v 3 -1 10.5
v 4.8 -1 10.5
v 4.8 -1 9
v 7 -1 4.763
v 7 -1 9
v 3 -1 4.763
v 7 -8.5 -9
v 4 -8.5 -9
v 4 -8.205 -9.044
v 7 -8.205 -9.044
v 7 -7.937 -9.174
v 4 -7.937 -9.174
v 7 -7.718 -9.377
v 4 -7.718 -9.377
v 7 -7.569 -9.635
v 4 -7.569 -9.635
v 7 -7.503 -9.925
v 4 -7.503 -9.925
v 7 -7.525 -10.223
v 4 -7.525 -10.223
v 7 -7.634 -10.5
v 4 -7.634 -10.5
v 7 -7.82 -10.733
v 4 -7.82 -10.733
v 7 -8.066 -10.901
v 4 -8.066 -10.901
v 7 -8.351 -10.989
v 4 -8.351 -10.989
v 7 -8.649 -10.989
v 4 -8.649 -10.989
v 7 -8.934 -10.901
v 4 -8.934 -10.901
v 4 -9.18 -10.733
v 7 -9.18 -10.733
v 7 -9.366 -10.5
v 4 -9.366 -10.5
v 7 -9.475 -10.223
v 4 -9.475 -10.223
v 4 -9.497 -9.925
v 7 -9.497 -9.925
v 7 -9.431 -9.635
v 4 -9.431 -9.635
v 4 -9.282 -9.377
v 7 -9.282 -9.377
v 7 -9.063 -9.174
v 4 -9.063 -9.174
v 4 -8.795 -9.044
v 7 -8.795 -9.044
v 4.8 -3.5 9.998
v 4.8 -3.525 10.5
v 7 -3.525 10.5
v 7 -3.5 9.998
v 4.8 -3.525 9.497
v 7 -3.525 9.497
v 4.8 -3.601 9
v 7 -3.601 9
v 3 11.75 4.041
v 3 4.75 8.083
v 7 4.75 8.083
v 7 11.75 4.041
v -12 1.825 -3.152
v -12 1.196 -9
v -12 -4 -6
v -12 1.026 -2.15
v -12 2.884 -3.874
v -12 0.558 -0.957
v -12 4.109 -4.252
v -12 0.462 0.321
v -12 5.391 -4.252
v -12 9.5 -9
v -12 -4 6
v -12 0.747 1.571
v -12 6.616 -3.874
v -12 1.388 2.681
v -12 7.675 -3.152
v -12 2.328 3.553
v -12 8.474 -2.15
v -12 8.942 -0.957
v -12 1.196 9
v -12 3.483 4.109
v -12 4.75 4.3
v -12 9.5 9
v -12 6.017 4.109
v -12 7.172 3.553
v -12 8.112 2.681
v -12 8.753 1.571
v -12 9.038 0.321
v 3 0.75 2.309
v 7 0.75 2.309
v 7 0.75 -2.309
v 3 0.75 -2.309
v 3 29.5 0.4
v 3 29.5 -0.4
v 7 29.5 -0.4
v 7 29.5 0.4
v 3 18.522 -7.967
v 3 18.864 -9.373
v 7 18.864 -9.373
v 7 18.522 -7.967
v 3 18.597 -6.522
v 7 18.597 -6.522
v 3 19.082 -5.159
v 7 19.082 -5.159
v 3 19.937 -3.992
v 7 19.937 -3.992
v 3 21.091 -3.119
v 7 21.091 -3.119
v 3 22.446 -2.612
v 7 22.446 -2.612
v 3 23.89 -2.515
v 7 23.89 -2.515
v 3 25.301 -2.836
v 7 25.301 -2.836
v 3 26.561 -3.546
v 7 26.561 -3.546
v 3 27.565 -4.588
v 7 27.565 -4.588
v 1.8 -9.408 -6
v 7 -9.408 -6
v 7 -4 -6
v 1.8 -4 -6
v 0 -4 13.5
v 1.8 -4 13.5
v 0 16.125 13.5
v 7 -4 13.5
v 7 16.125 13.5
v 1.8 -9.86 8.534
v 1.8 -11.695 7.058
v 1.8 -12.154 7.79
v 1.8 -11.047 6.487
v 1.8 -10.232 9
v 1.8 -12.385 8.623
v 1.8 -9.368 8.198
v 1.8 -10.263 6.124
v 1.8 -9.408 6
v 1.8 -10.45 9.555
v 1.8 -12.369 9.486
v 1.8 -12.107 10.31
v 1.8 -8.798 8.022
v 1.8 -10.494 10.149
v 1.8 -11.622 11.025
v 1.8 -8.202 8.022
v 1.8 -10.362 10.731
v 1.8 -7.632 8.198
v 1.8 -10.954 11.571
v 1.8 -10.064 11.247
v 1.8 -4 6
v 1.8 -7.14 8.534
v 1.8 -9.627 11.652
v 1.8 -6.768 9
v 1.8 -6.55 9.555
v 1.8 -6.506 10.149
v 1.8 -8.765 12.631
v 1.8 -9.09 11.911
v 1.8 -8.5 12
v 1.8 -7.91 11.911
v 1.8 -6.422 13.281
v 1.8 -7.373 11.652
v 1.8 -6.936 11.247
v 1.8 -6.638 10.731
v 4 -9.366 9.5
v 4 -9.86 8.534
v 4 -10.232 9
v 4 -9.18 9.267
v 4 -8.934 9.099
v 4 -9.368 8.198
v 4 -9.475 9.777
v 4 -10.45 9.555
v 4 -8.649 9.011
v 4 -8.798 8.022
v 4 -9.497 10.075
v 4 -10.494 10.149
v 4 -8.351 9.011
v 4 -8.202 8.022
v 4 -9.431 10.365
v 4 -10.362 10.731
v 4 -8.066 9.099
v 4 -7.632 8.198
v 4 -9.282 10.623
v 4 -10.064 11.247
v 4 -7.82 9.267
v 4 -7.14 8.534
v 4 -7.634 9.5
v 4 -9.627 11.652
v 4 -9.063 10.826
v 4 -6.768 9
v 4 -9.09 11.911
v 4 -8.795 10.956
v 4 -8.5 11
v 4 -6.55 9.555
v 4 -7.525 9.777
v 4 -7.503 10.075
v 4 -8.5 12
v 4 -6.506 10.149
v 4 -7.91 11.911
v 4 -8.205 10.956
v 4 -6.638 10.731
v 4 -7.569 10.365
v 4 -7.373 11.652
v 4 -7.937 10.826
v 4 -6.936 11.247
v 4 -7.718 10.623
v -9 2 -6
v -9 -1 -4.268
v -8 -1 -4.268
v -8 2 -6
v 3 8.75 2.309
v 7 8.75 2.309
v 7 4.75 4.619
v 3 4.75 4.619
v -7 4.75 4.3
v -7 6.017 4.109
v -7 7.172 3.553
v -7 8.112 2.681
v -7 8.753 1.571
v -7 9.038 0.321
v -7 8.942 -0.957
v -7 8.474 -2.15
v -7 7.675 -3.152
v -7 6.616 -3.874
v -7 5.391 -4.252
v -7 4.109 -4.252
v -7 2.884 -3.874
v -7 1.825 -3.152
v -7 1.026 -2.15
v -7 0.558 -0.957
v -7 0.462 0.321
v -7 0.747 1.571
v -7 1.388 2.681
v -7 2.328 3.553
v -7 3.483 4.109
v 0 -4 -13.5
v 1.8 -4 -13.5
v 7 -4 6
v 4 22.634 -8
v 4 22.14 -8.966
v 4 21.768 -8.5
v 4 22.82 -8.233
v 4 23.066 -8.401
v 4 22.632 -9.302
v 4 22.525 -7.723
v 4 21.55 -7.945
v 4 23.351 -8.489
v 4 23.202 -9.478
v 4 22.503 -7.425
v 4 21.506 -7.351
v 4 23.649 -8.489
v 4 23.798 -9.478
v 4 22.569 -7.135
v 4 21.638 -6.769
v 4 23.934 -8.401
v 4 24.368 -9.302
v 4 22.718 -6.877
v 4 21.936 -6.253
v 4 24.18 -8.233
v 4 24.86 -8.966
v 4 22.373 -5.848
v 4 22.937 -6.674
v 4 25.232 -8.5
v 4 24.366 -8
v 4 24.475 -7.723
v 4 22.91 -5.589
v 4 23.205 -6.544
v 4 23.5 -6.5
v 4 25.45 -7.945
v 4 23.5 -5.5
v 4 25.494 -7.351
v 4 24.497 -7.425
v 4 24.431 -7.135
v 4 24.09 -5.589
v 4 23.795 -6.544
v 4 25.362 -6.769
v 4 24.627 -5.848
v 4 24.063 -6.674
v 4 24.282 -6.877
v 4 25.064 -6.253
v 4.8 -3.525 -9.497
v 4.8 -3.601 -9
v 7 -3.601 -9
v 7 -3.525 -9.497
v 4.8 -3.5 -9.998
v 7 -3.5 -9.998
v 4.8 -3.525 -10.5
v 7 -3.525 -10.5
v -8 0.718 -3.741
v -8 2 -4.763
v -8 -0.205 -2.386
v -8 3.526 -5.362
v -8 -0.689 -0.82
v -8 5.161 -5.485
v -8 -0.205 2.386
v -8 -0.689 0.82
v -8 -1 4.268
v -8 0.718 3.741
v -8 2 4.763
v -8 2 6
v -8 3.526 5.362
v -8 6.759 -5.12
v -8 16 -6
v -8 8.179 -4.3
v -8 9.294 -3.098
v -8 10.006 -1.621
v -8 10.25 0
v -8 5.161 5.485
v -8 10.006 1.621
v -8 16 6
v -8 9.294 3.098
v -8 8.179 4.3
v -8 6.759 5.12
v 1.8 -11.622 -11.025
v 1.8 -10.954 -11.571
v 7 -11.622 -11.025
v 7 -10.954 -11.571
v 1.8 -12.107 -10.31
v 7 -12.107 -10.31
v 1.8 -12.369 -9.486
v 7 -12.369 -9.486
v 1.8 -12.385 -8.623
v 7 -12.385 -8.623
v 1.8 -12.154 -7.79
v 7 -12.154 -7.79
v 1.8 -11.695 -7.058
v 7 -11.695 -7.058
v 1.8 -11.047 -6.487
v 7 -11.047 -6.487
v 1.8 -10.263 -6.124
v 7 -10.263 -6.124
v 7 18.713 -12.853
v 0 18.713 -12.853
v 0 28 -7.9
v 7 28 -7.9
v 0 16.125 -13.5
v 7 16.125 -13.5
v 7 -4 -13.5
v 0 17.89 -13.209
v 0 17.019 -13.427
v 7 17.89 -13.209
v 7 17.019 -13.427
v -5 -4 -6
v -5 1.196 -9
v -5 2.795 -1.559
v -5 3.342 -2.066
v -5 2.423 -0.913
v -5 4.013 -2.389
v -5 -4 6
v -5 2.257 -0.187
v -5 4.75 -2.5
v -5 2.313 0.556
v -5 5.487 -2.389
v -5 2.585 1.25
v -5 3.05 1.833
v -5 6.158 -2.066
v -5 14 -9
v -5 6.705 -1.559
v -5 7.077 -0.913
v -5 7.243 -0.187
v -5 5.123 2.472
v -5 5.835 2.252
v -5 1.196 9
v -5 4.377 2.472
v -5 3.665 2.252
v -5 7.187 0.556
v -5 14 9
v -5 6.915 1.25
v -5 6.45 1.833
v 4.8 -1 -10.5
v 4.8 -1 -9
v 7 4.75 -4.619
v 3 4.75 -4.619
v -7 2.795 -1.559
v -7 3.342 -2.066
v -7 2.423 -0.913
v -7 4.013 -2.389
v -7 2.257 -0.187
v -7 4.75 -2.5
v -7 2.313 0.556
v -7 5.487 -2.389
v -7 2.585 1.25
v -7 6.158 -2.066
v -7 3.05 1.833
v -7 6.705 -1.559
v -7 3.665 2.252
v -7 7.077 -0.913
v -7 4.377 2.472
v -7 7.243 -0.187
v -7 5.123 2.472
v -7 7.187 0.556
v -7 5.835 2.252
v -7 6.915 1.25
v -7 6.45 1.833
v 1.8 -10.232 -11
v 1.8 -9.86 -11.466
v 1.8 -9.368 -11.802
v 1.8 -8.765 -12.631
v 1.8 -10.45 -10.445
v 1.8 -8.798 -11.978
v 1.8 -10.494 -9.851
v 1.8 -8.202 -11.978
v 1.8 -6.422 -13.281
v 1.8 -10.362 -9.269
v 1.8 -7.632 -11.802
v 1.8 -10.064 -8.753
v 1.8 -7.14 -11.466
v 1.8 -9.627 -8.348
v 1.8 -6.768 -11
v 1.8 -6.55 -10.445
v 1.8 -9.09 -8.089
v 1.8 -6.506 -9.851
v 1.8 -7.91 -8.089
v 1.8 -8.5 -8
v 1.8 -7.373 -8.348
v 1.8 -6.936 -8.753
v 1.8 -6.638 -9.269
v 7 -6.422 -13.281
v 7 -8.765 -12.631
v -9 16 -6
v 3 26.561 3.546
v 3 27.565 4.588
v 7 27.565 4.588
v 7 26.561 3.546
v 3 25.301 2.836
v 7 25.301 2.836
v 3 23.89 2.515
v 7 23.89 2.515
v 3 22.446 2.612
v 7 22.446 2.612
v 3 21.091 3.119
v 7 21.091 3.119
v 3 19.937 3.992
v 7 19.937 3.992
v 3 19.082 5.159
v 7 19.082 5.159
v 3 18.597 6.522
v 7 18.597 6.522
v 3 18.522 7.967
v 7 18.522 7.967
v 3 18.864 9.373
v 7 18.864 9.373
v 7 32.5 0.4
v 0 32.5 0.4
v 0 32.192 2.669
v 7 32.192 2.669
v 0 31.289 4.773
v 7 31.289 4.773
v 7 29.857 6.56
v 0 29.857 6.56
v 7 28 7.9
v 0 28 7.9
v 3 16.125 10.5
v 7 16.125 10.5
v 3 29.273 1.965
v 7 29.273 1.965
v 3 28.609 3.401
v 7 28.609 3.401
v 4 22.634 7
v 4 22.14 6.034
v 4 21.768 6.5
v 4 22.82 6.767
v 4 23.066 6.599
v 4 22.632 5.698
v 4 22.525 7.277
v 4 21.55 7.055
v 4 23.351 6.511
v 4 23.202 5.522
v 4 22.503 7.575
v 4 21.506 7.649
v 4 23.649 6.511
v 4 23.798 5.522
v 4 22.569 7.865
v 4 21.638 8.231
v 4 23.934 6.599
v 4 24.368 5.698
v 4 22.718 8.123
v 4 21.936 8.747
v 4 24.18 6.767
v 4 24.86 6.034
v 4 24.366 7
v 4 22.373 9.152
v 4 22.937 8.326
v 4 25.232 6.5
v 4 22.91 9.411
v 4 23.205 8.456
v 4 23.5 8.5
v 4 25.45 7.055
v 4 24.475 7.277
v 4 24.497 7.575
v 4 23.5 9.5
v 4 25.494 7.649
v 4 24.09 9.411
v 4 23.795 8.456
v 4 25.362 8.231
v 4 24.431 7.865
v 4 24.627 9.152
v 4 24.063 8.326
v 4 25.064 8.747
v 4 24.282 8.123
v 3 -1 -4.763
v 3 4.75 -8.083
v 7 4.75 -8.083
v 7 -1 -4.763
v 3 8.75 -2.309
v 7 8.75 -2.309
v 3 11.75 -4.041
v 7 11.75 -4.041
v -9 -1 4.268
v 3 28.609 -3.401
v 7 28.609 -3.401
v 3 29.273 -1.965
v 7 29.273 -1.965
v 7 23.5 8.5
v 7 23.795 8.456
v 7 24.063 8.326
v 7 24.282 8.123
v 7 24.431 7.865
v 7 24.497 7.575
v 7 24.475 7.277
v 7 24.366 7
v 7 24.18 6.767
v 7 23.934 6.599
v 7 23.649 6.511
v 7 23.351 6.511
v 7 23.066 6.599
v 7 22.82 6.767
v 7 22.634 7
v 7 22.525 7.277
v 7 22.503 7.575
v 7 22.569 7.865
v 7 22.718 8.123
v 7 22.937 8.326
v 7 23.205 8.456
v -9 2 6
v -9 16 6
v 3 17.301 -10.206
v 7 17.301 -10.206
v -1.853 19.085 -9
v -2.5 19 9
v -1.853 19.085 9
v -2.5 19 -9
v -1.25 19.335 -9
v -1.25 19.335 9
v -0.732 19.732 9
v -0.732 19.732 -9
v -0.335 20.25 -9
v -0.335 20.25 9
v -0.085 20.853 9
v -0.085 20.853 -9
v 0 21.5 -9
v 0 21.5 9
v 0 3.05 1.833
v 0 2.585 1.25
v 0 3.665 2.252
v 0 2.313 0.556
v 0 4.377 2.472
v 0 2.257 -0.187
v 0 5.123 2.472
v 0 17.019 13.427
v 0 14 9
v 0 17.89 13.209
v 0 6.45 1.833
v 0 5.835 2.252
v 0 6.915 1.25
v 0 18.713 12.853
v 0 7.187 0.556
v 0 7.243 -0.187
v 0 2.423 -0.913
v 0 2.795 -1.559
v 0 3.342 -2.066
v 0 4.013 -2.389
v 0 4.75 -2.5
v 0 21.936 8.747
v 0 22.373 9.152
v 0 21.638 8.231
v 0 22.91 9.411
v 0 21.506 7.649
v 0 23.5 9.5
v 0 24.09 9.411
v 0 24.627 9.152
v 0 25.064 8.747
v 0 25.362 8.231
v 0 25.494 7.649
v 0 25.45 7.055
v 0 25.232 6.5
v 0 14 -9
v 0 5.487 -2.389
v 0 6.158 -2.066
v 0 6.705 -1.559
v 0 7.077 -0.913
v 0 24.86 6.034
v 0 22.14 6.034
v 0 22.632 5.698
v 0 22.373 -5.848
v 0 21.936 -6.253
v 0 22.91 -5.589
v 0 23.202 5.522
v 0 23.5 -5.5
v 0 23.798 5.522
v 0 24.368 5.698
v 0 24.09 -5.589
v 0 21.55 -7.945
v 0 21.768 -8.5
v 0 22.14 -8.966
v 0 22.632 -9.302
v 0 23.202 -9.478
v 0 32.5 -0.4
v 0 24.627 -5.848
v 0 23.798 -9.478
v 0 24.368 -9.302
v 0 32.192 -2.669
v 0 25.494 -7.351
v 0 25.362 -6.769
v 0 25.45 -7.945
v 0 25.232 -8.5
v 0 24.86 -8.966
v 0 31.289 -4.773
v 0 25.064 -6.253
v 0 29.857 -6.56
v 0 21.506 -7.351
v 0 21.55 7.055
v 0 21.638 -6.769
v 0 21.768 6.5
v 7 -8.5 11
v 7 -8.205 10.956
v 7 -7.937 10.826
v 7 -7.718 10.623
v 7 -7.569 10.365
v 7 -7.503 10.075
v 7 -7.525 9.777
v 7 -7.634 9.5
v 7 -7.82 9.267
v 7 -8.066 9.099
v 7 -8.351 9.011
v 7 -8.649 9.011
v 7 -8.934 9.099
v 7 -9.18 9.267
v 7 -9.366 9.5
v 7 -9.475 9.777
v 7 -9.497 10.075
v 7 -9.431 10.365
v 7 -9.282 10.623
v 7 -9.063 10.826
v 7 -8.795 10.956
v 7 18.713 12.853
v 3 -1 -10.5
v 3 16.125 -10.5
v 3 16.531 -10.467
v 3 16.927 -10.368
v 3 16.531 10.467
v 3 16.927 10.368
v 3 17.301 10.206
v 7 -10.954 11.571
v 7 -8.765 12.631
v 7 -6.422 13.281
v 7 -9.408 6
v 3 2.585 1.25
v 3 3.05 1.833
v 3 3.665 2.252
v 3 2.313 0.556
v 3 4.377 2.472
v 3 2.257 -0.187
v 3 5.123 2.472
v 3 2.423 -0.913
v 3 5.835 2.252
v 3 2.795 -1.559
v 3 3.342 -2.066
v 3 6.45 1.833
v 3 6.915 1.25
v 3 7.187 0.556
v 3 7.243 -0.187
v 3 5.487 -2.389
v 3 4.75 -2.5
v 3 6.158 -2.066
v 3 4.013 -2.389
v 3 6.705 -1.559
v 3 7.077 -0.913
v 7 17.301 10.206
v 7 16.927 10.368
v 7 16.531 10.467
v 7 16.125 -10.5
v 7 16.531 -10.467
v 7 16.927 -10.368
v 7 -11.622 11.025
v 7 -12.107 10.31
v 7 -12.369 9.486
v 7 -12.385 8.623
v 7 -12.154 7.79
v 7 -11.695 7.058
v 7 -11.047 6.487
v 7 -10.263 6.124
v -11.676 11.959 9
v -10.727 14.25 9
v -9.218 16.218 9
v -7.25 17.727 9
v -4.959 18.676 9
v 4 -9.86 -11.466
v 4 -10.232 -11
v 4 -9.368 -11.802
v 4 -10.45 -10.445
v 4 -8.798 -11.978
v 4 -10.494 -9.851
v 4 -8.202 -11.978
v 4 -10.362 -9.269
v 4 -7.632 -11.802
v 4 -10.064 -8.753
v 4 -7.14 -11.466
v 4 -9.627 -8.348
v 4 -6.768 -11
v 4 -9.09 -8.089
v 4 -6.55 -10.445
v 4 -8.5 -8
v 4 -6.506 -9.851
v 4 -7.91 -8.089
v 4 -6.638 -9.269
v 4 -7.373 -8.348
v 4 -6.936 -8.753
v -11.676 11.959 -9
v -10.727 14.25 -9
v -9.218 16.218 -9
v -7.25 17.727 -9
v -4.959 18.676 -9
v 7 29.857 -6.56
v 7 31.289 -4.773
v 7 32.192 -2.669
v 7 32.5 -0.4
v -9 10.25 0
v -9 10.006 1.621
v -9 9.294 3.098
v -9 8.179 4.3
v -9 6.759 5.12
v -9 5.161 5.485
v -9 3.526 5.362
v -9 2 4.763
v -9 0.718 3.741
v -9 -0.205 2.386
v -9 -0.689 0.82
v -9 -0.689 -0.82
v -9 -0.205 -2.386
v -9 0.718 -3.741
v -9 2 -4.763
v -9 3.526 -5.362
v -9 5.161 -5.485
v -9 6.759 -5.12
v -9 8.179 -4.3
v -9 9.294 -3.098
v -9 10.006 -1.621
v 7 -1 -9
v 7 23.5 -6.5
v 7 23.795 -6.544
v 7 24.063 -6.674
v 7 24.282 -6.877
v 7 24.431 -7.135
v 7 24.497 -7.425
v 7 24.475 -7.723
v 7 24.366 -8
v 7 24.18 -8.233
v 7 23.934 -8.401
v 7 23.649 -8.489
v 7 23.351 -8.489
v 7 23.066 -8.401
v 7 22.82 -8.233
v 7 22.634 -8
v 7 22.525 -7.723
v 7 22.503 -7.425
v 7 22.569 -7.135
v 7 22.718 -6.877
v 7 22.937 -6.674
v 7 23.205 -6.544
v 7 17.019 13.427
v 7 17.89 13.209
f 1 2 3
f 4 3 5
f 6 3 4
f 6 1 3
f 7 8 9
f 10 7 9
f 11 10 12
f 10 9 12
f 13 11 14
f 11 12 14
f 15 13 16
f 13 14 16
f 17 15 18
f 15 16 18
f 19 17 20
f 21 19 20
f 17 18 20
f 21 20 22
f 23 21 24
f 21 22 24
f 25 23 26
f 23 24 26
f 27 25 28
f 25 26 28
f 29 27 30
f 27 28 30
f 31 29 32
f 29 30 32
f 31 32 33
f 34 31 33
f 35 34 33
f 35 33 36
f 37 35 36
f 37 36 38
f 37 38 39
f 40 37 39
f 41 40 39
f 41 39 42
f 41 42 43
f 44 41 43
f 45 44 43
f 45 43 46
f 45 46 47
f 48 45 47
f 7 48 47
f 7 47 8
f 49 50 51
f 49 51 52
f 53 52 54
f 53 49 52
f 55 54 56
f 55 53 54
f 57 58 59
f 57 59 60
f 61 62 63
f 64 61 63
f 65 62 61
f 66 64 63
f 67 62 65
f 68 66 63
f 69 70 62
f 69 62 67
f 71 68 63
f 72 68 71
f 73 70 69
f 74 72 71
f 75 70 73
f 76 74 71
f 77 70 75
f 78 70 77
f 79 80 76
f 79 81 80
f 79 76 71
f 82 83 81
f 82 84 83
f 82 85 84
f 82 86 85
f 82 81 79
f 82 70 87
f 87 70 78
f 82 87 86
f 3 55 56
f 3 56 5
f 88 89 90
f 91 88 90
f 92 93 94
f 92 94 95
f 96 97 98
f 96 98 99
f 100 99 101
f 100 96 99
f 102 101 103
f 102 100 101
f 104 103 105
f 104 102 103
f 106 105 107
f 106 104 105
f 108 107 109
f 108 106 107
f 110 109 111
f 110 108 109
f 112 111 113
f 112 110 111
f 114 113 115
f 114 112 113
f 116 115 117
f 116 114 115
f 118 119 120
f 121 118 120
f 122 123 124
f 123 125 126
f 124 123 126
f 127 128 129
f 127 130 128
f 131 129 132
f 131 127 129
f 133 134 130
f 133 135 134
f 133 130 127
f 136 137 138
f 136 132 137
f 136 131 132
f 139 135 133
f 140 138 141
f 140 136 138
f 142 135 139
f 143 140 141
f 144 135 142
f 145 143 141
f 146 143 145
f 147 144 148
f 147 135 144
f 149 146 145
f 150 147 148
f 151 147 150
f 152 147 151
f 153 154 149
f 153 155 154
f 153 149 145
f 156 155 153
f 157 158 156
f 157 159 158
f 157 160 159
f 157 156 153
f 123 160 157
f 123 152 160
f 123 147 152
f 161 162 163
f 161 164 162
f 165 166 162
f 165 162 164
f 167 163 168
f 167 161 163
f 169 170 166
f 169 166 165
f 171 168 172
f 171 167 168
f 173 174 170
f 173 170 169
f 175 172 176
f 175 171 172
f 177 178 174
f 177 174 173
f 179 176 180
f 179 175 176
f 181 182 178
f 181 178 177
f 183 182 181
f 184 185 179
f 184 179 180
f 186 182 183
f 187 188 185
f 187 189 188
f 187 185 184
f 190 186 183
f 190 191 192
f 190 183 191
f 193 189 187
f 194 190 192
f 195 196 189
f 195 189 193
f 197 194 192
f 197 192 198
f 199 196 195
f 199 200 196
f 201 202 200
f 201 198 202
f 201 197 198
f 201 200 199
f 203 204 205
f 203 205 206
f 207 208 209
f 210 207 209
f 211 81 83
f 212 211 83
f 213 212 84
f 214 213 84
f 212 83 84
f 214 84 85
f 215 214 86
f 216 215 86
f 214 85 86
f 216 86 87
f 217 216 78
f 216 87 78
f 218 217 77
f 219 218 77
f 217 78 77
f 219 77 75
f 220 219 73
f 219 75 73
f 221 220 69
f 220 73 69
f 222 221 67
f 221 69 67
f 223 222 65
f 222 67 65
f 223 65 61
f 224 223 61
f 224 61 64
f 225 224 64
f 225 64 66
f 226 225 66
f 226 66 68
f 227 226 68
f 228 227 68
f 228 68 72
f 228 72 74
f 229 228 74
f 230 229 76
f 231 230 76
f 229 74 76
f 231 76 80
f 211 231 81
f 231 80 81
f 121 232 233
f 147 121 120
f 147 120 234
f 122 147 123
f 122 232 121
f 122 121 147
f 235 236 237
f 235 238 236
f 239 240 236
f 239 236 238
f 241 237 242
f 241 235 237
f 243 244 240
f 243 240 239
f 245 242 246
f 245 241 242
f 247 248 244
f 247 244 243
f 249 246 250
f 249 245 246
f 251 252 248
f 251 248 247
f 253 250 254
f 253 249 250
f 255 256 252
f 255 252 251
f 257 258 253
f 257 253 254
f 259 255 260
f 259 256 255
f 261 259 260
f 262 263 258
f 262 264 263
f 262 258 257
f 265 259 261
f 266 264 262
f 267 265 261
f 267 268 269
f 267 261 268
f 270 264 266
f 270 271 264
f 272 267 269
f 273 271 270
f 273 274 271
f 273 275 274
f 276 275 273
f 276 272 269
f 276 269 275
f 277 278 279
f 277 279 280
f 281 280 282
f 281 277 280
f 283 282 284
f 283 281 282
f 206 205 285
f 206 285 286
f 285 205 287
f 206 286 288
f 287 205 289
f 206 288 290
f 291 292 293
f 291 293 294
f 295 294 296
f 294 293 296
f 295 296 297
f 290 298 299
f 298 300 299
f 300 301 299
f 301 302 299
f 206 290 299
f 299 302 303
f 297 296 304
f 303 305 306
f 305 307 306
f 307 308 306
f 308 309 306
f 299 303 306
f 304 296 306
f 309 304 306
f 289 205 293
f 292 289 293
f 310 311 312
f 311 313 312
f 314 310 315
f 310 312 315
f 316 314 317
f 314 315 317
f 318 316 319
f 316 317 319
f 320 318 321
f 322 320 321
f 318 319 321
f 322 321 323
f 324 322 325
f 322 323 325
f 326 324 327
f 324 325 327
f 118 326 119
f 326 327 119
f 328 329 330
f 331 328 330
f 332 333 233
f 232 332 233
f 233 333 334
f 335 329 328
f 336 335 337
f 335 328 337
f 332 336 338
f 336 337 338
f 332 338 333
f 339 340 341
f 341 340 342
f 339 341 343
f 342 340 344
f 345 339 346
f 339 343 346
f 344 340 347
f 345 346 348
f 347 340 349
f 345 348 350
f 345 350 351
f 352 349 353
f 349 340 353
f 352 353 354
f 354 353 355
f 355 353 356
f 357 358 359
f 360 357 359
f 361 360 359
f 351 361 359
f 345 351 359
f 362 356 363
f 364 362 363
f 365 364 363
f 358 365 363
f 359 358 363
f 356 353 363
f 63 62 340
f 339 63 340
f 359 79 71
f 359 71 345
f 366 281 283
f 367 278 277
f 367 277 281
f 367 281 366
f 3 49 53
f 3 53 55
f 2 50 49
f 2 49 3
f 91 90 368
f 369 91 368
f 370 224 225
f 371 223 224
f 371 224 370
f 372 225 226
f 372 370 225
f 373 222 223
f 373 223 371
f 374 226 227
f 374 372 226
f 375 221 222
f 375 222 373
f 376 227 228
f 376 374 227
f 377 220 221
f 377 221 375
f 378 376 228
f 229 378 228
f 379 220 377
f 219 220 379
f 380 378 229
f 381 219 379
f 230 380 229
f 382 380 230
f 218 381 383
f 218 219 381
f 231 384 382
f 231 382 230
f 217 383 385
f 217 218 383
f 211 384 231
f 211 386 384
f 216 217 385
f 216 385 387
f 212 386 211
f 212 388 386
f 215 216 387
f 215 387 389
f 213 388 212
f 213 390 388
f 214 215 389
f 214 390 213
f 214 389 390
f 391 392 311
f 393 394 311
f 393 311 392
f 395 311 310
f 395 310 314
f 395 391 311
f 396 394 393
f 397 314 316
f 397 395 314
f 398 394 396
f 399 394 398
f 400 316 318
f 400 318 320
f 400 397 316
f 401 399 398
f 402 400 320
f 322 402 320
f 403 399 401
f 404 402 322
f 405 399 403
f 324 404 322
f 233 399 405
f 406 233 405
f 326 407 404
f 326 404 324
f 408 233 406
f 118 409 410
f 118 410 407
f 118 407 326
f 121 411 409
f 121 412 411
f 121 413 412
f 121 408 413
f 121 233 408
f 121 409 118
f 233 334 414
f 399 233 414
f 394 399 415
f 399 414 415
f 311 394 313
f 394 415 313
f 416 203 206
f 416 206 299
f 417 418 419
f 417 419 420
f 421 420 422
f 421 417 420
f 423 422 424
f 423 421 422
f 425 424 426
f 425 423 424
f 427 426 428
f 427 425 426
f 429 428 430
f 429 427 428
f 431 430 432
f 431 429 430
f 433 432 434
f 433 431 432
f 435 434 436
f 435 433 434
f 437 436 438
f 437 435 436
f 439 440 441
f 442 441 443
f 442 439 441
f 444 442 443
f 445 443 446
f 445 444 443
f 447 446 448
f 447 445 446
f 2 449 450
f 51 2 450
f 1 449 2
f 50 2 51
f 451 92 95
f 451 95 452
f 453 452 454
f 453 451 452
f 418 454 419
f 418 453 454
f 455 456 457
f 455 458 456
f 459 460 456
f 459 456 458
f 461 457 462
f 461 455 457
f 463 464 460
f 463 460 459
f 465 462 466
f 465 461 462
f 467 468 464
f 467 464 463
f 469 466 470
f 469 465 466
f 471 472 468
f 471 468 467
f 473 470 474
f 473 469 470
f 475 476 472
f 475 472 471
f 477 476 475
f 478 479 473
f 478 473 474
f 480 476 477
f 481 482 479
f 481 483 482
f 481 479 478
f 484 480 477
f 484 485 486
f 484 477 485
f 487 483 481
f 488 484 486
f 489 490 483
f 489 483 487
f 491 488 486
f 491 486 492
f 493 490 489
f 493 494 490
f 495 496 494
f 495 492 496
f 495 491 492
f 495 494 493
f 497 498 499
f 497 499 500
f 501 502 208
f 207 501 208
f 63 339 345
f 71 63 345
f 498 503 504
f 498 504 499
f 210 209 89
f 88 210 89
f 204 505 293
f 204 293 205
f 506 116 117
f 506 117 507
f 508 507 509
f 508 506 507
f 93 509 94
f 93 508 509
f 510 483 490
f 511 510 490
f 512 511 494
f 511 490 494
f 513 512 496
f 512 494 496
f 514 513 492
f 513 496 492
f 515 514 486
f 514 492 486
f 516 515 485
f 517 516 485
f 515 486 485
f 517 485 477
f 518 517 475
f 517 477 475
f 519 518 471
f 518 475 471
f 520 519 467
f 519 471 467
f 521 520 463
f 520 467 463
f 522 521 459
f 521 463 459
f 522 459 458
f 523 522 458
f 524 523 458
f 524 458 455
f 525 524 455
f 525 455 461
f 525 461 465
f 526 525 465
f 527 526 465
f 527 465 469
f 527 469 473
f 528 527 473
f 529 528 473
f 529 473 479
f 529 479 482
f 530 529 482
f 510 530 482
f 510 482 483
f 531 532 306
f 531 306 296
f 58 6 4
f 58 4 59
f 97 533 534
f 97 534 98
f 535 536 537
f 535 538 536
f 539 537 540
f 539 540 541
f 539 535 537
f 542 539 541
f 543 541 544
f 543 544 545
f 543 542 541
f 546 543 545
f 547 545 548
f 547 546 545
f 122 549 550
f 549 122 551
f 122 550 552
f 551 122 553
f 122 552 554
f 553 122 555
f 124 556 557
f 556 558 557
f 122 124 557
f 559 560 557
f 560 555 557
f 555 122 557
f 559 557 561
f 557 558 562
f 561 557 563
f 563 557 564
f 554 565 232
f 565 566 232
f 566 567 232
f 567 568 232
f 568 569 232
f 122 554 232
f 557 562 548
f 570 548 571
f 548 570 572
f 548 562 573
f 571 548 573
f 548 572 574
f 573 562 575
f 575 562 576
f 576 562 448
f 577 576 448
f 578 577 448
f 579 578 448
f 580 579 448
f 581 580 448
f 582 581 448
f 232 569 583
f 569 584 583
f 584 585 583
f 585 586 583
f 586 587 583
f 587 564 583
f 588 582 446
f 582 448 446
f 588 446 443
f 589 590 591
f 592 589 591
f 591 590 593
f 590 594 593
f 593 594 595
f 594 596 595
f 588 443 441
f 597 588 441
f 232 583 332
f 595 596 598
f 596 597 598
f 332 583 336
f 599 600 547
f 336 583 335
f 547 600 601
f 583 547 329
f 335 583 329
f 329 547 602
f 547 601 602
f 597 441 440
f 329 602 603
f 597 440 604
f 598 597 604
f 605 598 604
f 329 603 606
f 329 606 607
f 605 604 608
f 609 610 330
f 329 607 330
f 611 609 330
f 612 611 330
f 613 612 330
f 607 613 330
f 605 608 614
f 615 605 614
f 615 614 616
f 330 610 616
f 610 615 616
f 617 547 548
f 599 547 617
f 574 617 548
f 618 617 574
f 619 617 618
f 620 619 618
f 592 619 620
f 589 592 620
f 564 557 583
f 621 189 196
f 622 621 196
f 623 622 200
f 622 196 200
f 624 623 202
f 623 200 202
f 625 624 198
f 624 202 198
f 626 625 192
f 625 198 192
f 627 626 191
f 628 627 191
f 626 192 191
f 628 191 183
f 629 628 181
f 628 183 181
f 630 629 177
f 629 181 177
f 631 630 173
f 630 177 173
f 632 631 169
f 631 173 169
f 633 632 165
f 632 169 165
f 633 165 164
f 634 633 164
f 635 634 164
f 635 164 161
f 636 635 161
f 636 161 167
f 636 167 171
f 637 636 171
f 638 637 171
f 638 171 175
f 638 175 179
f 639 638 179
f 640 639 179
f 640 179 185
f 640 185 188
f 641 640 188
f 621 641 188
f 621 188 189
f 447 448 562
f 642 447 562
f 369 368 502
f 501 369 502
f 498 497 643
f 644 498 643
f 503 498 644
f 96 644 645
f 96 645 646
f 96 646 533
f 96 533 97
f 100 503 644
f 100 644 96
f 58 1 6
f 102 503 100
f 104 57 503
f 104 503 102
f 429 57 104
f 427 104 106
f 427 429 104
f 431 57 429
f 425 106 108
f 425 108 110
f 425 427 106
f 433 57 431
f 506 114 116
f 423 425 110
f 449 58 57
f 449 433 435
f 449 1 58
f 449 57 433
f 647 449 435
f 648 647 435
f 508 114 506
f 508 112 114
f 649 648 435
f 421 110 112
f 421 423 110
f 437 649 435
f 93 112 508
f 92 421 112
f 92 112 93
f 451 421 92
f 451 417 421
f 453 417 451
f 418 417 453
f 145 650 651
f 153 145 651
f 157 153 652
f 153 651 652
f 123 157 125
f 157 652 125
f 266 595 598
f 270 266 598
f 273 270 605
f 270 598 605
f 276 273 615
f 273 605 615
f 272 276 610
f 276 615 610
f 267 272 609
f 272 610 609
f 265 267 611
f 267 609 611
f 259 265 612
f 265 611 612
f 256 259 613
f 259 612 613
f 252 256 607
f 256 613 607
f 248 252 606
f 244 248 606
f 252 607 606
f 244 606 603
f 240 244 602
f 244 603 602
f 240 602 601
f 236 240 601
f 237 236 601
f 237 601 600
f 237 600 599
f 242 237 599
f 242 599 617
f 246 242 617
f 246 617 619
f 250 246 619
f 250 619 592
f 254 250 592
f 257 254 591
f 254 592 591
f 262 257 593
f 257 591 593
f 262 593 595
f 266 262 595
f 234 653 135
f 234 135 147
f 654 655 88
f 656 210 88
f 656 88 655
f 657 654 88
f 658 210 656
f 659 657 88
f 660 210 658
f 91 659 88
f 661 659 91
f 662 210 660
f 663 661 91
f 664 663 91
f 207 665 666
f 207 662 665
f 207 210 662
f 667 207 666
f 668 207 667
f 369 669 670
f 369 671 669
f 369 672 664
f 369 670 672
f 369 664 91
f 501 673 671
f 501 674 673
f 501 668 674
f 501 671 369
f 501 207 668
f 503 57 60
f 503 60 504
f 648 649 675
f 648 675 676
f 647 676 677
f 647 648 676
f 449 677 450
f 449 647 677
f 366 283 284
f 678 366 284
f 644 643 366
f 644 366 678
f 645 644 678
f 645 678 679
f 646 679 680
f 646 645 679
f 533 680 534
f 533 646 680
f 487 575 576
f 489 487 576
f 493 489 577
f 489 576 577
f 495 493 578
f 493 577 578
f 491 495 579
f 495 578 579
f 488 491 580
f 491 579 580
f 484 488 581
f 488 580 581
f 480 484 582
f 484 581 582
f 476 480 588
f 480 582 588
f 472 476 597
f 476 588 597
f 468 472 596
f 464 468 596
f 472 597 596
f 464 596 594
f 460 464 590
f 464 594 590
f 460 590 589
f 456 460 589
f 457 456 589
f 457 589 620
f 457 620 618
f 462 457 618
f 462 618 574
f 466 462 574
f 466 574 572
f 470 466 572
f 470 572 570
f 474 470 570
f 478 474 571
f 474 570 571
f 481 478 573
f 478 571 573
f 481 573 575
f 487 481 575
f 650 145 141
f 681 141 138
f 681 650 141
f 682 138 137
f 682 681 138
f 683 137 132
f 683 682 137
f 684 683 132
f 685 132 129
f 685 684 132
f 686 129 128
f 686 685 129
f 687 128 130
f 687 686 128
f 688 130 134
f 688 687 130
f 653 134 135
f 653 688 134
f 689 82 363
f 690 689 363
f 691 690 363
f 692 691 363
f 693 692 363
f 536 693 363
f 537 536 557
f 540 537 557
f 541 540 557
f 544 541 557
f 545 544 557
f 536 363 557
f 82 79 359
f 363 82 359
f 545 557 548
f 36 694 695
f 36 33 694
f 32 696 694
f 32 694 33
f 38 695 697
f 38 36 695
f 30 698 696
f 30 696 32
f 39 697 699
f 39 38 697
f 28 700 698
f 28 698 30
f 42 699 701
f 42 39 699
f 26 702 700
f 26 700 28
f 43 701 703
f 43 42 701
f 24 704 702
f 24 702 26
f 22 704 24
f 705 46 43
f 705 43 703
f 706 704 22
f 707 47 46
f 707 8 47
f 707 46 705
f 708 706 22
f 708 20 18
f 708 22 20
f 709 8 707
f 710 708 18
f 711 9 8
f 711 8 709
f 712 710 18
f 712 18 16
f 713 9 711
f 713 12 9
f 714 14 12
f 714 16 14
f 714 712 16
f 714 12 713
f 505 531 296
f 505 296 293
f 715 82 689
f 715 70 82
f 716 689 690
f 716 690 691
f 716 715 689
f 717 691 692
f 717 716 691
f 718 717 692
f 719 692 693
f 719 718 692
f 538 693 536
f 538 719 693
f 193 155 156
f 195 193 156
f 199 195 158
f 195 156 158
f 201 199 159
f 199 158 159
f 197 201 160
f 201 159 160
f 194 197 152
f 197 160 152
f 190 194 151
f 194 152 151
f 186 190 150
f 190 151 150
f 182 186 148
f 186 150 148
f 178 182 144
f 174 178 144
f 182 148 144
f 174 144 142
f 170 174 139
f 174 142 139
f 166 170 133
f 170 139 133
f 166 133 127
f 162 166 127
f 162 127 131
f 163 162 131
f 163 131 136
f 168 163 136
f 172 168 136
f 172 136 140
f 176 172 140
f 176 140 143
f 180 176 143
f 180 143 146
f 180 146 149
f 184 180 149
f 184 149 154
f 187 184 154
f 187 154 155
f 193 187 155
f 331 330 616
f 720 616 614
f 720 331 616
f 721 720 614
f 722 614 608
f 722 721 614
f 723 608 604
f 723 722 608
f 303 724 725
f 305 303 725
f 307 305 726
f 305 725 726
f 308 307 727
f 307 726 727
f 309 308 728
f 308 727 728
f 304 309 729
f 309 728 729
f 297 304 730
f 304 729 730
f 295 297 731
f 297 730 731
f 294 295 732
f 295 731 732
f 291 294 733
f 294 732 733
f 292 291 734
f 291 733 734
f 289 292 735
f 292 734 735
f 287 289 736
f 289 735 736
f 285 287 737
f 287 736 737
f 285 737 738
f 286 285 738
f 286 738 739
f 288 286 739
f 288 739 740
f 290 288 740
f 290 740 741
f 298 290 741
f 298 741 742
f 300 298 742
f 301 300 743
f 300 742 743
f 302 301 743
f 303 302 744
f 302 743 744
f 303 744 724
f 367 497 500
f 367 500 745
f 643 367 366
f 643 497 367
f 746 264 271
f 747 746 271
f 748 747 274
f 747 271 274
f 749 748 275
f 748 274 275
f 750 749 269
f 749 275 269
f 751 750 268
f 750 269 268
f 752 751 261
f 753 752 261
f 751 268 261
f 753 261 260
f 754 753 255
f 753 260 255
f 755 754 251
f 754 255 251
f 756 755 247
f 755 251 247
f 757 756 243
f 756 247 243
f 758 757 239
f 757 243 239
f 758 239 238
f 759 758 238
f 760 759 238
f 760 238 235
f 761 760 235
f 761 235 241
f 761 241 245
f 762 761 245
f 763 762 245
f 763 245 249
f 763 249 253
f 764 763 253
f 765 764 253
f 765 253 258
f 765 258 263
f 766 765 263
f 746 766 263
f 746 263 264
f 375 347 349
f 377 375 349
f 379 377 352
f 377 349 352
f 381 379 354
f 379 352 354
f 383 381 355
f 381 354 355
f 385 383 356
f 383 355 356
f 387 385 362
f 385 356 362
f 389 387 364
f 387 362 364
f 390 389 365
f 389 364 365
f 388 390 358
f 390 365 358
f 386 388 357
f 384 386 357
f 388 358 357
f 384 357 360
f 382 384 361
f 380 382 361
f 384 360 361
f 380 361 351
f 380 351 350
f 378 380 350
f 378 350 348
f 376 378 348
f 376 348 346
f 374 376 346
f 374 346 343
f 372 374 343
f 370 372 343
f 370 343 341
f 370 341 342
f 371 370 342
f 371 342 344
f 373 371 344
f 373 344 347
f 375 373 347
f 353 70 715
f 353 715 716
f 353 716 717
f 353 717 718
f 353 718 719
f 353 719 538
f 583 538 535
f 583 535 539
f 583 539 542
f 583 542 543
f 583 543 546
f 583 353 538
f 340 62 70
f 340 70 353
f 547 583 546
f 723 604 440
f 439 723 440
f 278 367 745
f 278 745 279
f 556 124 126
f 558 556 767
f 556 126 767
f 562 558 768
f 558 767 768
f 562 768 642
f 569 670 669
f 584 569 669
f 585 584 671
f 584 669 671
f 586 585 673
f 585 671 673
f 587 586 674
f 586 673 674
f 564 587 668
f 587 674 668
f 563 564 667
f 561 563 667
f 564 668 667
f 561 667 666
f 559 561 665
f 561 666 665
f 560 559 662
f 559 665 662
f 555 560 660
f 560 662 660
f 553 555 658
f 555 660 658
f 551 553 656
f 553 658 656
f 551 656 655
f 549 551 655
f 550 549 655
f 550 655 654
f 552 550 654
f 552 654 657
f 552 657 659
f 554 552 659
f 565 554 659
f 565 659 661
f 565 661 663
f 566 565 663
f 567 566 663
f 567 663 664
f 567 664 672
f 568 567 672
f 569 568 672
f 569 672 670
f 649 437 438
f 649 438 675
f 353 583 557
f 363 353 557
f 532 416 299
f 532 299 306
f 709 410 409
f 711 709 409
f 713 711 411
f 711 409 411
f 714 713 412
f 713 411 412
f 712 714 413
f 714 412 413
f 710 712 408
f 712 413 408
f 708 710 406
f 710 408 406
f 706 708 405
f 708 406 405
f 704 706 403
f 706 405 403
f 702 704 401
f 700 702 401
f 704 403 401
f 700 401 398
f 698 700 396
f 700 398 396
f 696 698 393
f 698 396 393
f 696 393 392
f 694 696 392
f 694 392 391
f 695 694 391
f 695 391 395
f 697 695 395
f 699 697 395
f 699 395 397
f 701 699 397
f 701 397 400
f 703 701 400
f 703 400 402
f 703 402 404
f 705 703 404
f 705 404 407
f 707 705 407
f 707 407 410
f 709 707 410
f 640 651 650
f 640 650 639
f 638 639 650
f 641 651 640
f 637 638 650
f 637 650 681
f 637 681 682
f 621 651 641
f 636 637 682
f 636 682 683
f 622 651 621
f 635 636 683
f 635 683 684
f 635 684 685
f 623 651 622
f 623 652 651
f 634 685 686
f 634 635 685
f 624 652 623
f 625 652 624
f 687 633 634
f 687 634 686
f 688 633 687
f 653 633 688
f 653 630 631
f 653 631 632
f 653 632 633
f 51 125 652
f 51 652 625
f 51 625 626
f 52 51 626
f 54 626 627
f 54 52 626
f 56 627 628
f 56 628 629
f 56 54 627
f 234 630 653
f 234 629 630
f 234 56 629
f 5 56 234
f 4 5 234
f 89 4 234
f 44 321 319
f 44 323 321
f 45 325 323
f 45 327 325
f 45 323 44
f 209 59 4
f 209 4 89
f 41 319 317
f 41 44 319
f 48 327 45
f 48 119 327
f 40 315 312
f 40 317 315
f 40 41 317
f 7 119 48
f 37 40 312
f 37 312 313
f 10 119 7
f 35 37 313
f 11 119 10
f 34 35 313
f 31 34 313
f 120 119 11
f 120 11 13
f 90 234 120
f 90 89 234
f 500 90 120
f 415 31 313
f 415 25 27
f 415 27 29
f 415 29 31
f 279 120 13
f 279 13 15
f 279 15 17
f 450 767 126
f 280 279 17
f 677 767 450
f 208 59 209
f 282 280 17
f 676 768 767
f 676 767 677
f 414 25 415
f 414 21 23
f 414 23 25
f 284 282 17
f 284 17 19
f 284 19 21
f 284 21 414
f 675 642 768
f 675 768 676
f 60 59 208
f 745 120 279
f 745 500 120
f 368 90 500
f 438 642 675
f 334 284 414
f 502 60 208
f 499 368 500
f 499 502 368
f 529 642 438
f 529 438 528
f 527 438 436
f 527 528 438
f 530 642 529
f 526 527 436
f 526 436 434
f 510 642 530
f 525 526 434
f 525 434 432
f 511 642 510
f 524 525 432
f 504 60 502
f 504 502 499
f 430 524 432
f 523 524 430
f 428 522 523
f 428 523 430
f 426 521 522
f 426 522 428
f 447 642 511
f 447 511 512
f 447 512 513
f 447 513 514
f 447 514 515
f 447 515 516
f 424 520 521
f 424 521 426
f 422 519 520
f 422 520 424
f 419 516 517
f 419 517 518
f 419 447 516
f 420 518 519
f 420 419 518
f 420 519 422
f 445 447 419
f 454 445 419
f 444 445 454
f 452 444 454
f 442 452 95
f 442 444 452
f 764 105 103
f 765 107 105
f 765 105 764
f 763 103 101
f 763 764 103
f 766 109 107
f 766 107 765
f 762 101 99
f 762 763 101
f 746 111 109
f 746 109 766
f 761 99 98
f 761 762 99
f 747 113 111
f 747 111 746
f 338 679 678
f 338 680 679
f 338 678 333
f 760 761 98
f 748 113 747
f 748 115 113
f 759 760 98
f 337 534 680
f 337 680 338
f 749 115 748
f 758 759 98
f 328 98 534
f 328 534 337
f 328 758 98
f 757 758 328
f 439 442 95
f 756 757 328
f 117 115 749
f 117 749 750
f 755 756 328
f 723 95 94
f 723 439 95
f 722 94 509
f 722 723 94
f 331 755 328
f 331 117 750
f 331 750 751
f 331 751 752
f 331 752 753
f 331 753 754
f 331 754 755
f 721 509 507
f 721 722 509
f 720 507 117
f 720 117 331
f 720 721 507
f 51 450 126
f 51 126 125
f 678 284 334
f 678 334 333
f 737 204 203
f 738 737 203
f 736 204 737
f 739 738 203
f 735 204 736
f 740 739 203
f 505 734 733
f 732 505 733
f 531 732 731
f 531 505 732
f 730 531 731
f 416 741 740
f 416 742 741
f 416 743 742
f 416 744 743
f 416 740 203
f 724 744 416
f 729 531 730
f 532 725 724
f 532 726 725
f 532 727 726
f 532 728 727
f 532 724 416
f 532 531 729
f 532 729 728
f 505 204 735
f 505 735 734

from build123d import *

# Parameters (mm, degrees)
BOSS_EXTRUDE1_DEPTH = 7
FILLET1_R           = 8.5
FILLET2_R           = 5.5
FILLET3_R           = 13.5
SKETCH3_W           = 27
SKETCH3_H           = 13.5
CUT_EXTRUDE1_DEPTH  = 1.8
BOSS_EXTRUDE2_DEPTH = 5
BOSS_EXTRUDE3_DEPTH = 7
SKETCH10_R          = 2.5
CUT_EXTRUDE3_DEPTH  = 21
CUT_EXTRUDE5_REACH  = 41.994
SKETCH12_W          = 12
SKETCH12_H          = 13.5
CUT_EXTRUDE6_REACH  = 39.182
SKETCH13_R          = 1
SKETCH17_R          = 2
CUT_EXTRUDE14_DEPTH = 4
FILLET4_R           = 3
CUT_EXTRUDE16_REACH = 42.725
SKETCH19_W          = 12
SKETCH19_H          = 4.5
CHAMFER5_SIZE       = 3
CHAMFER5_SIZE2      = 5.196152423
CUT_EXTRUDE17_DEPTH = 4
SHELL1_START        = 3
SHELL1_DEPTH        = 4
SHELL1_START_2      = -9
SHELL1_2_OUTLINE_R  = 5.5
SHELL1_2_DEPTH      = 1
SHELL1_START_3      = 4.8
SHELL1_3_DEPTH      = 2.2
SKETCH21_R          = 4.3
CUT_EXTRUDE18_DEPTH = 5
FILLET5_R           = 9.5
FILLET6_R           = 2.5


# Read off the part's stored shape, not the designer's step: Shell1
with BuildPart() as part:
    # Sketch2 → Boss-Extrude1 (new body)
    with BuildSketch(Plane(origin=(0, 0, 0), x_dir=(0, 0, -1), z_dir=(1, 0, 0))):
        Polygon((-13.5, -17.5), (13.5, -17.5), (13.5, 17.5), (5.5, 32.5), (-5.5, 32.5), (-13.5, 17.5), align=None)
    extrude(amount=BOSS_EXTRUDE1_DEPTH)

    # Fillet1
    fillet1_edges = [part.edges().sort_by_distance(p)[0] for p in [
        (3.5, 32.5, 5.5),
        (3.5, 32.5, -5.5),
    ]]
    fillet(fillet1_edges, radius=FILLET1_R)

    # Fillet2
    fillet2_edges = [part.edges().sort_by_distance(p)[0] for p in [
        (3.5, 17.5, -13.5),
        (3.5, 17.5, 13.5),
    ]]
    fillet(fillet2_edges, radius=FILLET2_R)

    # Fillet3
    fillet3_edges = [part.edges().sort_by_distance(p)[0] for p in [
        (3.5, -17.5, 13.5),
        (3.5, -17.5, -13.5),
    ]]
    fillet(fillet3_edges, radius=FILLET3_R - 0.0001)  # a hair under: the kernel refuses the full size

    # Sketch3 → Cut-Extrude1 (cut)
    with BuildSketch(Plane.ZY):
        with Locations((0, -10.75)):
            Rectangle(SKETCH3_W, SKETCH3_H)
    extrude(amount=-CUT_EXTRUDE1_DEPTH, mode=Mode.SUBTRACT)

    # Sketch6 → Boss-Extrude2 (add)
    with BuildSketch(Plane.ZY):
        with BuildLine():
            Line((-13.5, 14), (13.5, 14))
            Line((13.5, 14), (13.5, 16.125))
            ThreePointArc((13.5, 16.125), (13.293303509, 17.618632471), (12.688749833, 19))
            Line((12.688749833, 19), (-12.688749833, 19))
            ThreePointArc((-12.688749833, 19), (-13.293303509, 17.618632471), (-13.5, 16.125))
            Line((-13.5, 16.125), (-13.5, 14))
        make_face()
    extrude(amount=BOSS_EXTRUDE2_DEPTH)

    # Sketch9 → Boss-Extrude3 (add)
    with BuildSketch(Plane.ZY.offset(5)):
        with BuildLine():
            Line((-13.5, 14), (-13.5, -4))
            Line((-13.5, -4), (13.5, -4))
            Line((13.5, -4), (13.5, 14))
            Line((13.5, 14), (13.5, 16.125))
            ThreePointArc((13.5, 16.125), (13.293303509, 17.618632471), (12.688749833, 19))
            Line((12.688749833, 19), (-12.688749833, 19))
            ThreePointArc((-12.688749833, 19), (-13.293303509, 17.618632471), (-13.5, 16.125))
            Line((-13.5, 16.125), (-13.5, 14))
        make_face()
    extrude(amount=BOSS_EXTRUDE3_DEPTH)

    # Sketch10 → Cut-Extrude3 (cut)
    with BuildSketch(Plane(origin=(7, 0, 0), x_dir=(0, 0, -1), z_dir=(1, 0, 0))):
        with Locations((0, 4.75)):
            Circle(SKETCH10_R)
    extrude(amount=-CUT_EXTRUDE3_DEPTH, mode=Mode.SUBTRACT)

    # Sketch12 → Cut-Extrude5 (cut, up to next)
    with BuildSketch(Plane(origin=(7, 0, 0), x_dir=(0, 0, -1), z_dir=(1, 0, 0)), mode=Mode.PRIVATE) as cut_extrude5_sk1:
        with Locations((0, -10.75)):
            Rectangle(SKETCH12_W, SKETCH12_H)
    cut_extrude5_tool1 = extrude(cut_extrude5_sk1.sketch, amount=-CUT_EXTRUDE5_REACH, mode=Mode.PRIVATE) & part.part
    add(cut_extrude5_tool1.solids().sort_by_distance((7, -10.75, 0))[0], mode=Mode.SUBTRACT)

    # Sketch13 → Cut-Extrude6 (cut, up to next)
    with BuildSketch(Plane.ZY, mode=Mode.PRIVATE) as cut_extrude6_sk1:
        with Locations((-7.5, 23.5)):
            Circle(SKETCH13_R)
    cut_extrude6_tool1 = extrude(cut_extrude6_sk1.sketch, amount=-CUT_EXTRUDE6_REACH, mode=Mode.PRIVATE) & part.part
    # Sketch13 → Cut-Extrude6 (cut, up to next)
    with BuildSketch(Plane.ZY, mode=Mode.PRIVATE) as cut_extrude6_sk2:
        with Locations((-10, -8.5)):
            Circle(SKETCH13_R)
    cut_extrude6_tool2 = extrude(cut_extrude6_sk2.sketch, amount=-CUT_EXTRUDE6_REACH, mode=Mode.PRIVATE) & part.part
    # Sketch13 → Cut-Extrude6 (cut, up to next)
    with BuildSketch(Plane.ZY, mode=Mode.PRIVATE) as cut_extrude6_sk3:
        with Locations((10, -8.5)):
            Circle(SKETCH13_R)
    cut_extrude6_tool3 = extrude(cut_extrude6_sk3.sketch, amount=-CUT_EXTRUDE6_REACH, mode=Mode.PRIVATE) & part.part
    # Sketch13 → Cut-Extrude6 (cut, up to next)
    with BuildSketch(Plane.ZY, mode=Mode.PRIVATE) as cut_extrude6_sk4:
        with Locations((7.5, 23.5)):
            Circle(SKETCH13_R)
    cut_extrude6_tool4 = extrude(cut_extrude6_sk4.sketch, amount=-CUT_EXTRUDE6_REACH, mode=Mode.PRIVATE) & part.part
    add(cut_extrude6_tool1.solids().sort_by_distance((0, 23.5, -7.5))[0], mode=Mode.SUBTRACT)
    add(cut_extrude6_tool2.solids().sort_by_distance((0, -8.5, -10))[0], mode=Mode.SUBTRACT)
    add(cut_extrude6_tool3.solids().sort_by_distance((0, -8.5, 10))[0], mode=Mode.SUBTRACT)
    add(cut_extrude6_tool4.solids().sort_by_distance((0, 23.5, 7.5))[0], mode=Mode.SUBTRACT)

    # Sketch17 → Cut-Extrude14 (cut)
    with BuildSketch(Plane.ZY):
        with Locations((-7.5, 23.5)):
            Circle(SKETCH17_R)
        with Locations((7.5, 23.5)):
            Circle(SKETCH17_R)
        with Locations((-10, -8.5)):
            Circle(SKETCH17_R)
        with Locations((10, -8.5)):
            Circle(SKETCH17_R)
    extrude(amount=-CUT_EXTRUDE14_DEPTH, mode=Mode.SUBTRACT)

    # Fillet4
    fillet4_edges = [part.edges().sort_by_distance(p)[0] for p in [
        (4.4, -16.093424605, -6),
        (4.4, -16.093424605, 6),
    ]]
    fillet(fillet4_edges, radius=FILLET4_R)

    # Sketch19 → Cut-Extrude16 (cut, up to next)
    with BuildSketch(Plane.XZ.offset(4), mode=Mode.PRIVATE) as cut_extrude16_sk1:
        with Locations((-6, -11.25)):
            Rectangle(SKETCH19_W, SKETCH19_H)
    cut_extrude16_tool1 = extrude(cut_extrude16_sk1.sketch, amount=-CUT_EXTRUDE16_REACH, mode=Mode.PRIVATE) & part.part
    # Sketch19 → Cut-Extrude16 (cut, up to next)
    with BuildSketch(Plane.XZ.offset(4), mode=Mode.PRIVATE) as cut_extrude16_sk2:
        with Locations((-6, 11.25)):
            Rectangle(SKETCH19_W, SKETCH19_H)
    cut_extrude16_tool2 = extrude(cut_extrude16_sk2.sketch, amount=-CUT_EXTRUDE16_REACH, mode=Mode.PRIVATE) & part.part
    add(cut_extrude16_tool1.solids().sort_by_distance((-6, -4, -11.25))[0], mode=Mode.SUBTRACT)
    add(cut_extrude16_tool2.solids().sort_by_distance((-6, -4, 11.25))[0], mode=Mode.SUBTRACT)

    # Chamfer5
    chamfer5_edges = [part.edges().sort_by_distance(p)[0] for p in [
        (-8.5, -4, -9),
        (-8.5, -4, 9),
    ]]
    chamfer5_side = [part.faces().sort_by_distance(p)[0] for p in [
        (-8.5, -4, 0),
    ]]
    chamfer(chamfer5_edges, length=CHAMFER5_SIZE, length2=CHAMFER5_SIZE2, reference=chamfer5_side[0])

    # Sketch20 → Cut-Extrude17 (cut)
    with BuildSketch(Plane(origin=(7, 0, 0), x_dir=(0, 0, -1), z_dir=(1, 0, 0))):
        Polygon((2.309401077, 8.75), (-2.309401077, 8.75), (-4.618802154, 4.75), (-2.309401077, 0.75), (2.309401077, 0.75), (4.618802154, 4.75), align=None)
    extrude(amount=-CUT_EXTRUDE17_DEPTH, mode=Mode.SUBTRACT)

    # Shell1 outline → Shell1 (cut)
    with BuildSketch(Plane.YZ.offset(SHELL1_START)):
        with BuildLine():
            Line((4.75, 8.082903769), (11.75, 4.041451884))
            Line((11.75, 4.041451884), (11.75, -4.041451884))
            Line((11.75, -4.041451884), (4.75, -8.082903769))
            Line((4.75, -8.082903769), (-1, -4.763139721))
            Line((-1, -4.763139721), (-1, -10.5))
            Line((-1, -10.5), (16.125, -10.5))
            ThreePointArc((16.125, -10.5), (16.731339062, -10.42535625), (17.301470588, -10.205882353))
            Line((17.301470588, -10.205882353), (18.863900358, -9.372586476))
            ThreePointArc((18.863900358, -9.372586476), (21.090892464, -3.118653074), (27.564772739, -4.588364277))
            ThreePointArc((27.564772739, -4.588364277), (28.99280733, -2.706918934), (29.5, -0.4))
            Line((29.5, -0.4), (29.5, 0.4))
            ThreePointArc((29.5, 0.4), (28.99280733, 2.706918934), (27.564772739, 4.588364277))
            ThreePointArc((27.564772739, 4.588364277), (21.090892464, 3.118653074), (18.863900358, 9.372586476))
            Line((18.863900358, 9.372586476), (17.301470588, 10.205882353))
            ThreePointArc((17.301470588, 10.205882353), (16.731339062, 10.42535625), (16.125, 10.5))
            Line((16.125, 10.5), (-1, 10.5))
            Line((-1, 10.5), (-1, 4.763139721))
            Line((-1, 4.763139721), (4.75, 8.082903769))
        make_face()
    extrude(amount=SHELL1_DEPTH, mode=Mode.SUBTRACT)

    # Shell1 2 outline → Shell1 2 (cut)
    with BuildSketch(Plane.YZ.offset(SHELL1_START_2)):
        Polygon((16, -6), (16, 6), (2, 6), (-1, 4.267949192), (-1, -4.267949192), (2, -6), align=None)
        with Locations((4.75, 0)):
            Circle(SHELL1_2_OUTLINE_R, mode=Mode.SUBTRACT)
    extrude(amount=SHELL1_2_DEPTH, mode=Mode.SUBTRACT)

    # Shell1 3 outline → Shell1 3 (cut)
    with BuildSketch(Plane.YZ.offset(SHELL1_START_3)):
        with BuildLine():
            Line((-1, -10.5), (-1, -9))
            Line((-1, -9), (-3.601020514, -9))
            ThreePointArc((-3.601020514, -9), (-3.506398333, -9.747131669), (-3.525062814, -10.5))
            Line((-3.525062814, -10.5), (-1, -10.5))
        make_face()
        with BuildLine():
            Line((-3.601020514, 9), (-1, 9))
            Line((-1, 9), (-1, 10.5))
            Line((-1, 10.5), (-3.525062814, 10.5))
            ThreePointArc((-3.525062814, 10.5), (-3.506398333, 9.747131669), (-3.601020514, 9))
        make_face()
    extrude(amount=SHELL1_3_DEPTH, mode=Mode.SUBTRACT)

    # Sketch21 → Cut-Extrude18 (cut)
    with BuildSketch(Plane.ZY.offset(12)):
        with Locations((0, 4.75)):
            Circle(SKETCH21_R)
    extrude(amount=-CUT_EXTRUDE18_DEPTH, mode=Mode.SUBTRACT)

    # Fillet5
    fillet5_edges = [part.edges().sort_by_distance(p)[0] for p in [
        (-12, 19, 0),
    ]]
    fillet(fillet5_edges, radius=FILLET5_R)

    # Fillet6
    fillet6_edges = [part.edges().sort_by_distance(p)[0] for p in [
        (0, 19, 0),
    ]]
    fillet(fillet6_edges, radius=FILLET6_R - 0.0001)  # a hair under: the kernel refuses the full size


solid = part.part
